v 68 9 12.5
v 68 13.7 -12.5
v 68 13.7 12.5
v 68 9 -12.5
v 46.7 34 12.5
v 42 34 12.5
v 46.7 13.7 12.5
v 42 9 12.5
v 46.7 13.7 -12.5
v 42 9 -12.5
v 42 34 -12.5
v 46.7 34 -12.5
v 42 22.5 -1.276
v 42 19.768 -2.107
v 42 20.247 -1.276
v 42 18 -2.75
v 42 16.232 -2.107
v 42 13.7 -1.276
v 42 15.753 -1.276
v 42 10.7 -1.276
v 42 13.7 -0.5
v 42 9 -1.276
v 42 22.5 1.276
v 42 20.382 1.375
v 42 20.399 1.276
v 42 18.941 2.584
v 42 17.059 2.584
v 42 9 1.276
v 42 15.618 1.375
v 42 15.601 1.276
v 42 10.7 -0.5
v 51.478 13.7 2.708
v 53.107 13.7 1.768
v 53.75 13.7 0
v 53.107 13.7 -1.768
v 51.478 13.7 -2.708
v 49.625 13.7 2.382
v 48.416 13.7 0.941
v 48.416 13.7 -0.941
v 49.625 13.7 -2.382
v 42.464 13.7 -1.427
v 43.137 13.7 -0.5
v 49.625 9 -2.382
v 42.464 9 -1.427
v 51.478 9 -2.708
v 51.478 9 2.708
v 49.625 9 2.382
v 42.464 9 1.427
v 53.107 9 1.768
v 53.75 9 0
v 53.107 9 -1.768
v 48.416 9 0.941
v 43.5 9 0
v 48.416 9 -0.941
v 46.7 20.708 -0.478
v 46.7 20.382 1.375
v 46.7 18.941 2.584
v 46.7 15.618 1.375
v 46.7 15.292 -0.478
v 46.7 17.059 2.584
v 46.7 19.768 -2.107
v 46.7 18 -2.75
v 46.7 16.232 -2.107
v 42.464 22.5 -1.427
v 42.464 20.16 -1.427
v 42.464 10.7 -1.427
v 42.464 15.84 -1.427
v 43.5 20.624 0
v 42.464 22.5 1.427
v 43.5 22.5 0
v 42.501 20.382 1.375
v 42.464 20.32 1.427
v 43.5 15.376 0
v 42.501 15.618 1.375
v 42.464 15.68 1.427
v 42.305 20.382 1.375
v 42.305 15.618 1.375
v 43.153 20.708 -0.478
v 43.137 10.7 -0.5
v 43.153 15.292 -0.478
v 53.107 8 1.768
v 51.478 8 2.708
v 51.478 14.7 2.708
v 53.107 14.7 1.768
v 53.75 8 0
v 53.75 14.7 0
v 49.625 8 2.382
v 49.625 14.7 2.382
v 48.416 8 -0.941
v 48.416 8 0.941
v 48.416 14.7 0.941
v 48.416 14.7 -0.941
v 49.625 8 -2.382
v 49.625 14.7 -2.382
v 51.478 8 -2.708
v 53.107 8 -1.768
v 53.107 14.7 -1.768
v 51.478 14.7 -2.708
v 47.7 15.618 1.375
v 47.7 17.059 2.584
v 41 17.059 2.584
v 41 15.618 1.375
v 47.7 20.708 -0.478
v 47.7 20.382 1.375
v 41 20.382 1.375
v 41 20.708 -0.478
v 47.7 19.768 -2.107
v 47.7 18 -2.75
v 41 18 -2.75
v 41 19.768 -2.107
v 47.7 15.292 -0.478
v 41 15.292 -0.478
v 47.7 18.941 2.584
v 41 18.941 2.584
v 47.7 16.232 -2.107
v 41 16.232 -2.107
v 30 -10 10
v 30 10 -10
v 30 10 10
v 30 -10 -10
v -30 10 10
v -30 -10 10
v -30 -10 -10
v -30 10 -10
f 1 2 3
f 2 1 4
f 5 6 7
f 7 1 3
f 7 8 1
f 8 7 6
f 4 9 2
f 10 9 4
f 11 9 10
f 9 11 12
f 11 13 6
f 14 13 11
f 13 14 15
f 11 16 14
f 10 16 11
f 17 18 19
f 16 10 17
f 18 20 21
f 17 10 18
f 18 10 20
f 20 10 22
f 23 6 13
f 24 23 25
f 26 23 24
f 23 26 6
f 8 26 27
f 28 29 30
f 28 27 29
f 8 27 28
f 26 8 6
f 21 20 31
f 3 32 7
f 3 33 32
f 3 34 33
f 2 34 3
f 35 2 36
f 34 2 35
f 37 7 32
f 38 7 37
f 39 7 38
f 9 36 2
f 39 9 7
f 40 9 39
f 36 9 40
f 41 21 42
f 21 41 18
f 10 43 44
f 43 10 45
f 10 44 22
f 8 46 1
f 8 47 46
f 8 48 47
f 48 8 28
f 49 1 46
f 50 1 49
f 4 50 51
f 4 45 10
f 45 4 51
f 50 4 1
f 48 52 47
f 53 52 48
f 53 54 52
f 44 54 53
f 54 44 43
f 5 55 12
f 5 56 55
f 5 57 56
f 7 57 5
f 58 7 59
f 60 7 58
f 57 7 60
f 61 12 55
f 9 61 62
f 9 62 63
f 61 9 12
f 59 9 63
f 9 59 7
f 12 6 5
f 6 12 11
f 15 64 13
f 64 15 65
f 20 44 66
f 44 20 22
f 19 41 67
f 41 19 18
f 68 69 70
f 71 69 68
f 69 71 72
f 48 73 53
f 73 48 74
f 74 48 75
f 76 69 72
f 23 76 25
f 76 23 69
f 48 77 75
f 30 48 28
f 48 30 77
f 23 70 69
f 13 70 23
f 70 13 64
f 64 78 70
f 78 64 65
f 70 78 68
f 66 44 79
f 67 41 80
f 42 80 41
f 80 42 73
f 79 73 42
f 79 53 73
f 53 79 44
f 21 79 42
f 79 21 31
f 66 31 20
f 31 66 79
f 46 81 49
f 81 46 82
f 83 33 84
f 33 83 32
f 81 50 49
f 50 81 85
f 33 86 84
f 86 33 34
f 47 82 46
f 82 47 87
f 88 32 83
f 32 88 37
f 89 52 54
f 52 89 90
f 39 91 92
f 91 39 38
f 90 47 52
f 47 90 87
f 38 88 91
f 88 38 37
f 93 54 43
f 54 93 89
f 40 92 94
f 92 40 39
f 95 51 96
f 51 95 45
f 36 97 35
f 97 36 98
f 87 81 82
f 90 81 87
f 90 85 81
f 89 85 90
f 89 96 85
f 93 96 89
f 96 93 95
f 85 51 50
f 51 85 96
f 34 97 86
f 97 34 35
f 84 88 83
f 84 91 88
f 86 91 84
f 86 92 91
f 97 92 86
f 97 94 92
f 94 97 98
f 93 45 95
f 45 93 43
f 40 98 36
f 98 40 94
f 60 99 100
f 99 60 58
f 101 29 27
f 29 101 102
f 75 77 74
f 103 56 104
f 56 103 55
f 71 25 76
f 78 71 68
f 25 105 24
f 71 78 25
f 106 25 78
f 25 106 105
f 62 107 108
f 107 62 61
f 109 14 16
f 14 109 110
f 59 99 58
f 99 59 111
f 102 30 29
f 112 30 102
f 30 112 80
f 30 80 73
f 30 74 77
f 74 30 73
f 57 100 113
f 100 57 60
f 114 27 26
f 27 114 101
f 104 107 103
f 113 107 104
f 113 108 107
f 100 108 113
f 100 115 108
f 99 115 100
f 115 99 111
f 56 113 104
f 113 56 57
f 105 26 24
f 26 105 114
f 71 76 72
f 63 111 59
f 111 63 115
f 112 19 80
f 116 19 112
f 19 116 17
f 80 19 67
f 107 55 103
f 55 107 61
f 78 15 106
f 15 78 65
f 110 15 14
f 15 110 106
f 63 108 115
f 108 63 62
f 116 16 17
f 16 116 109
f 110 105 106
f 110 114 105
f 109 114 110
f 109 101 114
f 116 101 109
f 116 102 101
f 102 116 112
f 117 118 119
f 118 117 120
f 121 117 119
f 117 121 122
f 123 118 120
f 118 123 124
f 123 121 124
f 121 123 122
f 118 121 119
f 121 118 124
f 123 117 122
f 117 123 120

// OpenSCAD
// Parameters
overall_x = 26; //[13:52:0.5]
overall_y = 25; //[12.5:50:0.5]
base_thickness = 4.7; //[2.35:9.4:0.1]
intended_joint_angle_deg = 90; //[60:120:1]
hole_count = 2; //[2:2:1]
hole_diameter = 5.5; //[3:8:0.1]
hole_edge_offset = 9; //[5:18:0.5]
hole_center_from_plate_mid = 0; //[-2:2:0.1]
gusset_thickness = 3; //[1.5:6:0.1]
gusset_height = 12; //[6:24:0.5]
gusset_length = 18; //[9:36:0.5]
inside_corner_relief = 1.5; //[0:4:0.1]
overlap = 1; //[0.5:2:0.1]
extrusion_size = 20; //[10:40:1]
extrusion_length = 60; //[30:120:1]

// Extrusion - detailed geometry
module extrusion() {
  color([0.85, 0.85, 0.8]) {
    cube([extrusion_length, extrusion_size, extrusion_size], center=true);
  }
}

// Extrusion Corner Bracket Hole Positions - detailed geometry
module extrusion_corner_bracket_hole_positions() {
  color("Silver") {
    translate([hole_edge_offset, base_thickness/2 + hole_center_from_plate_mid, 0])
      rotate([90, 0, 0])
      cylinder(r=hole_diameter/2, h=base_thickness + 2*overlap, center=true);
    translate([base_thickness/2 + hole_center_from_plate_mid, hole_edge_offset, 0])
      rotate([0, 90, 0])
      cylinder(r=hole_diameter/2, h=base_thickness + 2*overlap, center=true);
  }
}

// Extrusion Corner Bracket - detailed geometry
module extrusion_corner_bracket() {
  color("Silver") {
    difference() {
      union() {
        translate([overall_x/2, base_thickness/2, 0])
          cube([overall_x, base_thickness, overall_y], center=true);
        translate([base_thickness/2, overall_y/2, 0])
          cube([base_thickness, overall_y, overall_y], center=true);
      }
      translate([0, 0, 0])
        rotate([90, 0, 0])
        cylinder(r=inside_corner_relief, h=overall_y + 2*overlap, center=true);
    }
  }
}

// Extrusion Corner Bracket 3D - detailed geometry
module extrusion_corner_bracket_3D() {
  color("Silver") {
    union() {
      extrusion_corner_bracket();
      translate([gusset_length/2, base_thickness - gusset_thickness/2, -overall_y/2 + gusset_height/2])
        cube([gusset_length, gusset_thickness, gusset_height], center=true);
      translate([base_thickness - gusset_thickness/2, gusset_length/2, -overall_y/2 + gusset_height/2])
        cube([gusset_thickness, gusset_length, gusset_height], center=true);
    }
  }
}

// Extrusion Corner Bracket Assembly - detailed geometry
module extrusion_corner_bracket_assembly() {
  color("Silver") {
    union() {
      extrusion_corner_bracket_3D();
      extrusion_corner_bracket_hole_positions();
    }
  }
}

// Assembly
module assembly() {
  extrusion();
  translate([overall_x/2 + extrusion_length/2 - overlap, extrusion_size/2 - overlap, 0])
    extrusion_corner_bracket_assembly();
}

assembly();
